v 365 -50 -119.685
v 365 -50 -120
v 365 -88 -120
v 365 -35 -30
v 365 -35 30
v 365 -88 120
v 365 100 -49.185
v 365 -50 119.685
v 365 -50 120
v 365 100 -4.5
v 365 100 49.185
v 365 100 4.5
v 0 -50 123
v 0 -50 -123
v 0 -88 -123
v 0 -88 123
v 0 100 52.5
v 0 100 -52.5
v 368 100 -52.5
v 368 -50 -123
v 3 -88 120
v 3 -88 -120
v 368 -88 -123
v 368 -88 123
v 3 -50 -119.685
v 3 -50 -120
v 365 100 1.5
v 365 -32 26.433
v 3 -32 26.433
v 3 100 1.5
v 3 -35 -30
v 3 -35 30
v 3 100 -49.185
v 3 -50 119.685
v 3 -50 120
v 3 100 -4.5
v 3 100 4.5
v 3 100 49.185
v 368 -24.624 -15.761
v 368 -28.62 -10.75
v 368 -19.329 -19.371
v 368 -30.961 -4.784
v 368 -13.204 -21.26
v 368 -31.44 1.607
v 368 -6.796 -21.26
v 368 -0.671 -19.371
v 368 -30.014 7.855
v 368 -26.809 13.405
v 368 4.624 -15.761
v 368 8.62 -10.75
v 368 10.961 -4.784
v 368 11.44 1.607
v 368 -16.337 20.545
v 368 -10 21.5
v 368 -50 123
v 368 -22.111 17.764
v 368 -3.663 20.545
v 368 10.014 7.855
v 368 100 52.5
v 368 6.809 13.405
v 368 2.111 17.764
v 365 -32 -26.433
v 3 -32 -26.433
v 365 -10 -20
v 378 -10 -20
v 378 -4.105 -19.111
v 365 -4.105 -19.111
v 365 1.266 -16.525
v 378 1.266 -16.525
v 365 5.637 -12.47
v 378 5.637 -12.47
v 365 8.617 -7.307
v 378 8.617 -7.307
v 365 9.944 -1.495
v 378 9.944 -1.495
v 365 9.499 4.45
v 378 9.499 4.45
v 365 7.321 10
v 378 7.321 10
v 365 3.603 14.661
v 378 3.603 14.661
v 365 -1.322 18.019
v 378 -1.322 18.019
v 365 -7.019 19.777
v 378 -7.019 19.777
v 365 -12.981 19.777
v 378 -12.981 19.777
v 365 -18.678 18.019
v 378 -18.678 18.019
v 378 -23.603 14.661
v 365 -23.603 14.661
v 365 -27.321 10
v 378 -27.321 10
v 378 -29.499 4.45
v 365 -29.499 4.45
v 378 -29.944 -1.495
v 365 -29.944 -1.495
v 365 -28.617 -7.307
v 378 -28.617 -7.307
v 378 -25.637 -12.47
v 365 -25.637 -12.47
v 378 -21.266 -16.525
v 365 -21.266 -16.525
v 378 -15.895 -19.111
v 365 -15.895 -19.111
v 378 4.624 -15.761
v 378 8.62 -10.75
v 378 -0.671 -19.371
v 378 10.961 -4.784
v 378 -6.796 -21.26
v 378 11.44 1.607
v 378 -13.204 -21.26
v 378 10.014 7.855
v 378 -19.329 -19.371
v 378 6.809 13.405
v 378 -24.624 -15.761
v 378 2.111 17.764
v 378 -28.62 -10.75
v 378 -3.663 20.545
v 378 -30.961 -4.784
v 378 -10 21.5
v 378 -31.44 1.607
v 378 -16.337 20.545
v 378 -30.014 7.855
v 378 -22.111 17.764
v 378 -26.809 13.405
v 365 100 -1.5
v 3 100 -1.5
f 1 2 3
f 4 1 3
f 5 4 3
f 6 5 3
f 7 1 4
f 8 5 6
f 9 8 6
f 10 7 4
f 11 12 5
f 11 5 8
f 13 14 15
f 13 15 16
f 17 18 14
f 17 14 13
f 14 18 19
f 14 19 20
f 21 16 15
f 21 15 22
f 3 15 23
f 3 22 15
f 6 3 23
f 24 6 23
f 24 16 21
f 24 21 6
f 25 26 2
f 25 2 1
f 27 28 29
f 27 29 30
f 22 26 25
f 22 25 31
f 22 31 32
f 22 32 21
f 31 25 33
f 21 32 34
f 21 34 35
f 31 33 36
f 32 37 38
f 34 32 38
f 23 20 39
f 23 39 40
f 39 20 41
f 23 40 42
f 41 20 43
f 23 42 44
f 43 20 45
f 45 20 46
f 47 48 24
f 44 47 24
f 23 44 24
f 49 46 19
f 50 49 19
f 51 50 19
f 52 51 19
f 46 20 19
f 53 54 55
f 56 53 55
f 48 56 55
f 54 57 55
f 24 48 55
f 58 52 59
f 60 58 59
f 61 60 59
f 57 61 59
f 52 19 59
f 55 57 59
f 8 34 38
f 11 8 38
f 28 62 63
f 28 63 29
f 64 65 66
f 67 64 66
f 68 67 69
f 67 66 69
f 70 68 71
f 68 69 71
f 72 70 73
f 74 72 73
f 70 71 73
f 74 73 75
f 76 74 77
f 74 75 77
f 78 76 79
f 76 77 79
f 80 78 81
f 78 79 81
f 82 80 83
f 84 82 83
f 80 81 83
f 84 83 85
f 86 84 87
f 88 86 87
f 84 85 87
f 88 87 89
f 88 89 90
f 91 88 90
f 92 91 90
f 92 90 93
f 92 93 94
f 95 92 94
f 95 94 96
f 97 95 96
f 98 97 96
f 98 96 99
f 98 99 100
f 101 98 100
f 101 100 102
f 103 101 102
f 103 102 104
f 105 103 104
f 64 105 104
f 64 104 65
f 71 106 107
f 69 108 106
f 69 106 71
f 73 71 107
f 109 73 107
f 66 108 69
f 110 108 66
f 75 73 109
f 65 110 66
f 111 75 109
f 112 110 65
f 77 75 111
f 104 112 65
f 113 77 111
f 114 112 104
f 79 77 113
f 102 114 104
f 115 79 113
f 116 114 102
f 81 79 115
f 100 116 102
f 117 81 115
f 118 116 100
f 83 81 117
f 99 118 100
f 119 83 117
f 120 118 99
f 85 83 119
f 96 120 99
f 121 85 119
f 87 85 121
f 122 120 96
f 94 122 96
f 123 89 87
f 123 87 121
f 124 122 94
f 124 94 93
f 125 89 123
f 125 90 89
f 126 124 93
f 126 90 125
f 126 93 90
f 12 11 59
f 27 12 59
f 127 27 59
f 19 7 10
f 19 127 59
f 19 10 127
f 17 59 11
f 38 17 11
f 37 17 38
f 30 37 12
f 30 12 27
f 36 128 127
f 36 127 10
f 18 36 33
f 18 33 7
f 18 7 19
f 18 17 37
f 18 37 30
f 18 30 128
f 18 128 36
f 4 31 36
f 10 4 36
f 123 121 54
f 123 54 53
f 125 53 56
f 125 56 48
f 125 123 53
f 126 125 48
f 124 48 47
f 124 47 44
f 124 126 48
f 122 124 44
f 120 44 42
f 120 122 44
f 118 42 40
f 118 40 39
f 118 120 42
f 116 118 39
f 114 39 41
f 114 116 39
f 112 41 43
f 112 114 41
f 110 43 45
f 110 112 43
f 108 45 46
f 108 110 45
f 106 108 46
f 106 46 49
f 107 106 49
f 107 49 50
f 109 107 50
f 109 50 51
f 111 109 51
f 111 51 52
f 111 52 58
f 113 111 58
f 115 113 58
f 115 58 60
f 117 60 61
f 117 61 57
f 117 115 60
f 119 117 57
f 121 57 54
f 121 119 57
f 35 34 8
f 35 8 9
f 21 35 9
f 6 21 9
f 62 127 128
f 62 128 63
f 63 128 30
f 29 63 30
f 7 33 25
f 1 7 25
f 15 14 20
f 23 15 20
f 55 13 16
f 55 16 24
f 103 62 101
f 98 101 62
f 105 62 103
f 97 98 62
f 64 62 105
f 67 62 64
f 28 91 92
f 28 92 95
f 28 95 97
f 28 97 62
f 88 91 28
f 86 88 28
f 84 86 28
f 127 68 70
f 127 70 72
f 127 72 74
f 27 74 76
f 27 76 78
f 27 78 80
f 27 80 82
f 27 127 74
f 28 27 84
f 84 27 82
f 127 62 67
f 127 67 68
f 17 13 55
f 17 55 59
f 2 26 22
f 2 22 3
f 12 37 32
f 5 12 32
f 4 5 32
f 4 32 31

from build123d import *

# Parameters (mm, degrees)
BOSS_EXTRUDE1_DEPTH = 368
SHELL2_T            = -3
BOSS_EXTRUDE3_REACH = 402.691
CUT_EXTRUDE1_REACH  = 402.691
SKETCH9_R           = 20
BOSS_EXTRUDE4_START = 10
SKETCH10_R          = 21.5
SKETCH10_R_2        = 20
BOSS_EXTRUDE4_DEPTH = 10
SKETCH11_W          = 368
SKETCH11_H          = 246
SKETCH11_W_2        = 362
SKETCH11_H_2        = 240
BOSS_EXTRUDE5_DEPTH = 38


with BuildPart() as part:
    # Sketch2 → Boss-Extrude1 (new body)
    with BuildSketch(Plane(origin=(0, 0, 0), x_dir=(0, 0, -1), z_dir=(1, 0, 0))):
        Polygon((123, -50), (-123, -50), (-52.5, 100), (52.5, 100), align=None)
    extrude(amount=BOSS_EXTRUDE1_DEPTH)

    # Shell2
    shell2_openings = [part.faces().sort_by_distance(p)[0] for p in [
        (184, 100, 0),
        (184, -50, 0),
    ]]
    offset(amount=SHELL2_T, openings=shell2_openings, kind=Kind.INTERSECTION)

    # Sketch8 → Boss-Extrude3 (add, up to next)
    with BuildSketch(Plane(origin=(368, 0, 0), x_dir=(0, 0, -1), z_dir=(1, 0, 0)), mode=Mode.PRIVATE) as boss_extrude3_sk1:
        Polygon((-4.5, 100), (-30, -35), (30, -35), (4.5, 100), (1.5, 100), (26.433333333, -32), (-26.433333333, -32), (-1.5, 100), align=None)
    boss_extrude3_tool1 = extrude(boss_extrude3_sk1.sketch, amount=-BOSS_EXTRUDE3_REACH, mode=Mode.PRIVATE) - part.part
    add(boss_extrude3_tool1.solids().sort_by_distance((368, 34.274202, 15.418325))[0])

    # Sketch9 → Cut-Extrude1 (cut, up to next)
    with BuildSketch(Plane(origin=(368, 0, 0), x_dir=(0, 0, -1), z_dir=(1, 0, 0)), mode=Mode.PRIVATE) as cut_extrude1_sk1:
        with Locations((0, -10)):
            Circle(SKETCH9_R)
    cut_extrude1_tool1 = extrude(cut_extrude1_sk1.sketch, amount=-CUT_EXTRUDE1_REACH, mode=Mode.PRIVATE) & part.part
    add(cut_extrude1_tool1.solids().sort_by_distance((368, -10, 0))[0], mode=Mode.SUBTRACT)

    # Sketch10 → Boss-Extrude4 (add)
    with BuildSketch(Plane(origin=(368, 0, 0), x_dir=(0, 0, -1), z_dir=(1, 0, 0)).offset(BOSS_EXTRUDE4_START)):
        with Locations(Location((0, -10, 0), (0, 0, 180))):
            Circle(SKETCH10_R)
        with Locations((0, -10)):
            Circle(SKETCH10_R_2, mode=Mode.SUBTRACT)
    extrude(amount=-BOSS_EXTRUDE4_DEPTH)

    # Sketch11 → Boss-Extrude5 (add)
    with BuildSketch(Plane.XZ.offset(50)):
        with Locations((184, 0)):
            Rectangle(SKETCH11_W, SKETCH11_H)
        with Locations((184, 0)):
            Rectangle(SKETCH11_W_2, SKETCH11_H_2, mode=Mode.SUBTRACT)
    extrude(amount=BOSS_EXTRUDE5_DEPTH)


solid = part.part
